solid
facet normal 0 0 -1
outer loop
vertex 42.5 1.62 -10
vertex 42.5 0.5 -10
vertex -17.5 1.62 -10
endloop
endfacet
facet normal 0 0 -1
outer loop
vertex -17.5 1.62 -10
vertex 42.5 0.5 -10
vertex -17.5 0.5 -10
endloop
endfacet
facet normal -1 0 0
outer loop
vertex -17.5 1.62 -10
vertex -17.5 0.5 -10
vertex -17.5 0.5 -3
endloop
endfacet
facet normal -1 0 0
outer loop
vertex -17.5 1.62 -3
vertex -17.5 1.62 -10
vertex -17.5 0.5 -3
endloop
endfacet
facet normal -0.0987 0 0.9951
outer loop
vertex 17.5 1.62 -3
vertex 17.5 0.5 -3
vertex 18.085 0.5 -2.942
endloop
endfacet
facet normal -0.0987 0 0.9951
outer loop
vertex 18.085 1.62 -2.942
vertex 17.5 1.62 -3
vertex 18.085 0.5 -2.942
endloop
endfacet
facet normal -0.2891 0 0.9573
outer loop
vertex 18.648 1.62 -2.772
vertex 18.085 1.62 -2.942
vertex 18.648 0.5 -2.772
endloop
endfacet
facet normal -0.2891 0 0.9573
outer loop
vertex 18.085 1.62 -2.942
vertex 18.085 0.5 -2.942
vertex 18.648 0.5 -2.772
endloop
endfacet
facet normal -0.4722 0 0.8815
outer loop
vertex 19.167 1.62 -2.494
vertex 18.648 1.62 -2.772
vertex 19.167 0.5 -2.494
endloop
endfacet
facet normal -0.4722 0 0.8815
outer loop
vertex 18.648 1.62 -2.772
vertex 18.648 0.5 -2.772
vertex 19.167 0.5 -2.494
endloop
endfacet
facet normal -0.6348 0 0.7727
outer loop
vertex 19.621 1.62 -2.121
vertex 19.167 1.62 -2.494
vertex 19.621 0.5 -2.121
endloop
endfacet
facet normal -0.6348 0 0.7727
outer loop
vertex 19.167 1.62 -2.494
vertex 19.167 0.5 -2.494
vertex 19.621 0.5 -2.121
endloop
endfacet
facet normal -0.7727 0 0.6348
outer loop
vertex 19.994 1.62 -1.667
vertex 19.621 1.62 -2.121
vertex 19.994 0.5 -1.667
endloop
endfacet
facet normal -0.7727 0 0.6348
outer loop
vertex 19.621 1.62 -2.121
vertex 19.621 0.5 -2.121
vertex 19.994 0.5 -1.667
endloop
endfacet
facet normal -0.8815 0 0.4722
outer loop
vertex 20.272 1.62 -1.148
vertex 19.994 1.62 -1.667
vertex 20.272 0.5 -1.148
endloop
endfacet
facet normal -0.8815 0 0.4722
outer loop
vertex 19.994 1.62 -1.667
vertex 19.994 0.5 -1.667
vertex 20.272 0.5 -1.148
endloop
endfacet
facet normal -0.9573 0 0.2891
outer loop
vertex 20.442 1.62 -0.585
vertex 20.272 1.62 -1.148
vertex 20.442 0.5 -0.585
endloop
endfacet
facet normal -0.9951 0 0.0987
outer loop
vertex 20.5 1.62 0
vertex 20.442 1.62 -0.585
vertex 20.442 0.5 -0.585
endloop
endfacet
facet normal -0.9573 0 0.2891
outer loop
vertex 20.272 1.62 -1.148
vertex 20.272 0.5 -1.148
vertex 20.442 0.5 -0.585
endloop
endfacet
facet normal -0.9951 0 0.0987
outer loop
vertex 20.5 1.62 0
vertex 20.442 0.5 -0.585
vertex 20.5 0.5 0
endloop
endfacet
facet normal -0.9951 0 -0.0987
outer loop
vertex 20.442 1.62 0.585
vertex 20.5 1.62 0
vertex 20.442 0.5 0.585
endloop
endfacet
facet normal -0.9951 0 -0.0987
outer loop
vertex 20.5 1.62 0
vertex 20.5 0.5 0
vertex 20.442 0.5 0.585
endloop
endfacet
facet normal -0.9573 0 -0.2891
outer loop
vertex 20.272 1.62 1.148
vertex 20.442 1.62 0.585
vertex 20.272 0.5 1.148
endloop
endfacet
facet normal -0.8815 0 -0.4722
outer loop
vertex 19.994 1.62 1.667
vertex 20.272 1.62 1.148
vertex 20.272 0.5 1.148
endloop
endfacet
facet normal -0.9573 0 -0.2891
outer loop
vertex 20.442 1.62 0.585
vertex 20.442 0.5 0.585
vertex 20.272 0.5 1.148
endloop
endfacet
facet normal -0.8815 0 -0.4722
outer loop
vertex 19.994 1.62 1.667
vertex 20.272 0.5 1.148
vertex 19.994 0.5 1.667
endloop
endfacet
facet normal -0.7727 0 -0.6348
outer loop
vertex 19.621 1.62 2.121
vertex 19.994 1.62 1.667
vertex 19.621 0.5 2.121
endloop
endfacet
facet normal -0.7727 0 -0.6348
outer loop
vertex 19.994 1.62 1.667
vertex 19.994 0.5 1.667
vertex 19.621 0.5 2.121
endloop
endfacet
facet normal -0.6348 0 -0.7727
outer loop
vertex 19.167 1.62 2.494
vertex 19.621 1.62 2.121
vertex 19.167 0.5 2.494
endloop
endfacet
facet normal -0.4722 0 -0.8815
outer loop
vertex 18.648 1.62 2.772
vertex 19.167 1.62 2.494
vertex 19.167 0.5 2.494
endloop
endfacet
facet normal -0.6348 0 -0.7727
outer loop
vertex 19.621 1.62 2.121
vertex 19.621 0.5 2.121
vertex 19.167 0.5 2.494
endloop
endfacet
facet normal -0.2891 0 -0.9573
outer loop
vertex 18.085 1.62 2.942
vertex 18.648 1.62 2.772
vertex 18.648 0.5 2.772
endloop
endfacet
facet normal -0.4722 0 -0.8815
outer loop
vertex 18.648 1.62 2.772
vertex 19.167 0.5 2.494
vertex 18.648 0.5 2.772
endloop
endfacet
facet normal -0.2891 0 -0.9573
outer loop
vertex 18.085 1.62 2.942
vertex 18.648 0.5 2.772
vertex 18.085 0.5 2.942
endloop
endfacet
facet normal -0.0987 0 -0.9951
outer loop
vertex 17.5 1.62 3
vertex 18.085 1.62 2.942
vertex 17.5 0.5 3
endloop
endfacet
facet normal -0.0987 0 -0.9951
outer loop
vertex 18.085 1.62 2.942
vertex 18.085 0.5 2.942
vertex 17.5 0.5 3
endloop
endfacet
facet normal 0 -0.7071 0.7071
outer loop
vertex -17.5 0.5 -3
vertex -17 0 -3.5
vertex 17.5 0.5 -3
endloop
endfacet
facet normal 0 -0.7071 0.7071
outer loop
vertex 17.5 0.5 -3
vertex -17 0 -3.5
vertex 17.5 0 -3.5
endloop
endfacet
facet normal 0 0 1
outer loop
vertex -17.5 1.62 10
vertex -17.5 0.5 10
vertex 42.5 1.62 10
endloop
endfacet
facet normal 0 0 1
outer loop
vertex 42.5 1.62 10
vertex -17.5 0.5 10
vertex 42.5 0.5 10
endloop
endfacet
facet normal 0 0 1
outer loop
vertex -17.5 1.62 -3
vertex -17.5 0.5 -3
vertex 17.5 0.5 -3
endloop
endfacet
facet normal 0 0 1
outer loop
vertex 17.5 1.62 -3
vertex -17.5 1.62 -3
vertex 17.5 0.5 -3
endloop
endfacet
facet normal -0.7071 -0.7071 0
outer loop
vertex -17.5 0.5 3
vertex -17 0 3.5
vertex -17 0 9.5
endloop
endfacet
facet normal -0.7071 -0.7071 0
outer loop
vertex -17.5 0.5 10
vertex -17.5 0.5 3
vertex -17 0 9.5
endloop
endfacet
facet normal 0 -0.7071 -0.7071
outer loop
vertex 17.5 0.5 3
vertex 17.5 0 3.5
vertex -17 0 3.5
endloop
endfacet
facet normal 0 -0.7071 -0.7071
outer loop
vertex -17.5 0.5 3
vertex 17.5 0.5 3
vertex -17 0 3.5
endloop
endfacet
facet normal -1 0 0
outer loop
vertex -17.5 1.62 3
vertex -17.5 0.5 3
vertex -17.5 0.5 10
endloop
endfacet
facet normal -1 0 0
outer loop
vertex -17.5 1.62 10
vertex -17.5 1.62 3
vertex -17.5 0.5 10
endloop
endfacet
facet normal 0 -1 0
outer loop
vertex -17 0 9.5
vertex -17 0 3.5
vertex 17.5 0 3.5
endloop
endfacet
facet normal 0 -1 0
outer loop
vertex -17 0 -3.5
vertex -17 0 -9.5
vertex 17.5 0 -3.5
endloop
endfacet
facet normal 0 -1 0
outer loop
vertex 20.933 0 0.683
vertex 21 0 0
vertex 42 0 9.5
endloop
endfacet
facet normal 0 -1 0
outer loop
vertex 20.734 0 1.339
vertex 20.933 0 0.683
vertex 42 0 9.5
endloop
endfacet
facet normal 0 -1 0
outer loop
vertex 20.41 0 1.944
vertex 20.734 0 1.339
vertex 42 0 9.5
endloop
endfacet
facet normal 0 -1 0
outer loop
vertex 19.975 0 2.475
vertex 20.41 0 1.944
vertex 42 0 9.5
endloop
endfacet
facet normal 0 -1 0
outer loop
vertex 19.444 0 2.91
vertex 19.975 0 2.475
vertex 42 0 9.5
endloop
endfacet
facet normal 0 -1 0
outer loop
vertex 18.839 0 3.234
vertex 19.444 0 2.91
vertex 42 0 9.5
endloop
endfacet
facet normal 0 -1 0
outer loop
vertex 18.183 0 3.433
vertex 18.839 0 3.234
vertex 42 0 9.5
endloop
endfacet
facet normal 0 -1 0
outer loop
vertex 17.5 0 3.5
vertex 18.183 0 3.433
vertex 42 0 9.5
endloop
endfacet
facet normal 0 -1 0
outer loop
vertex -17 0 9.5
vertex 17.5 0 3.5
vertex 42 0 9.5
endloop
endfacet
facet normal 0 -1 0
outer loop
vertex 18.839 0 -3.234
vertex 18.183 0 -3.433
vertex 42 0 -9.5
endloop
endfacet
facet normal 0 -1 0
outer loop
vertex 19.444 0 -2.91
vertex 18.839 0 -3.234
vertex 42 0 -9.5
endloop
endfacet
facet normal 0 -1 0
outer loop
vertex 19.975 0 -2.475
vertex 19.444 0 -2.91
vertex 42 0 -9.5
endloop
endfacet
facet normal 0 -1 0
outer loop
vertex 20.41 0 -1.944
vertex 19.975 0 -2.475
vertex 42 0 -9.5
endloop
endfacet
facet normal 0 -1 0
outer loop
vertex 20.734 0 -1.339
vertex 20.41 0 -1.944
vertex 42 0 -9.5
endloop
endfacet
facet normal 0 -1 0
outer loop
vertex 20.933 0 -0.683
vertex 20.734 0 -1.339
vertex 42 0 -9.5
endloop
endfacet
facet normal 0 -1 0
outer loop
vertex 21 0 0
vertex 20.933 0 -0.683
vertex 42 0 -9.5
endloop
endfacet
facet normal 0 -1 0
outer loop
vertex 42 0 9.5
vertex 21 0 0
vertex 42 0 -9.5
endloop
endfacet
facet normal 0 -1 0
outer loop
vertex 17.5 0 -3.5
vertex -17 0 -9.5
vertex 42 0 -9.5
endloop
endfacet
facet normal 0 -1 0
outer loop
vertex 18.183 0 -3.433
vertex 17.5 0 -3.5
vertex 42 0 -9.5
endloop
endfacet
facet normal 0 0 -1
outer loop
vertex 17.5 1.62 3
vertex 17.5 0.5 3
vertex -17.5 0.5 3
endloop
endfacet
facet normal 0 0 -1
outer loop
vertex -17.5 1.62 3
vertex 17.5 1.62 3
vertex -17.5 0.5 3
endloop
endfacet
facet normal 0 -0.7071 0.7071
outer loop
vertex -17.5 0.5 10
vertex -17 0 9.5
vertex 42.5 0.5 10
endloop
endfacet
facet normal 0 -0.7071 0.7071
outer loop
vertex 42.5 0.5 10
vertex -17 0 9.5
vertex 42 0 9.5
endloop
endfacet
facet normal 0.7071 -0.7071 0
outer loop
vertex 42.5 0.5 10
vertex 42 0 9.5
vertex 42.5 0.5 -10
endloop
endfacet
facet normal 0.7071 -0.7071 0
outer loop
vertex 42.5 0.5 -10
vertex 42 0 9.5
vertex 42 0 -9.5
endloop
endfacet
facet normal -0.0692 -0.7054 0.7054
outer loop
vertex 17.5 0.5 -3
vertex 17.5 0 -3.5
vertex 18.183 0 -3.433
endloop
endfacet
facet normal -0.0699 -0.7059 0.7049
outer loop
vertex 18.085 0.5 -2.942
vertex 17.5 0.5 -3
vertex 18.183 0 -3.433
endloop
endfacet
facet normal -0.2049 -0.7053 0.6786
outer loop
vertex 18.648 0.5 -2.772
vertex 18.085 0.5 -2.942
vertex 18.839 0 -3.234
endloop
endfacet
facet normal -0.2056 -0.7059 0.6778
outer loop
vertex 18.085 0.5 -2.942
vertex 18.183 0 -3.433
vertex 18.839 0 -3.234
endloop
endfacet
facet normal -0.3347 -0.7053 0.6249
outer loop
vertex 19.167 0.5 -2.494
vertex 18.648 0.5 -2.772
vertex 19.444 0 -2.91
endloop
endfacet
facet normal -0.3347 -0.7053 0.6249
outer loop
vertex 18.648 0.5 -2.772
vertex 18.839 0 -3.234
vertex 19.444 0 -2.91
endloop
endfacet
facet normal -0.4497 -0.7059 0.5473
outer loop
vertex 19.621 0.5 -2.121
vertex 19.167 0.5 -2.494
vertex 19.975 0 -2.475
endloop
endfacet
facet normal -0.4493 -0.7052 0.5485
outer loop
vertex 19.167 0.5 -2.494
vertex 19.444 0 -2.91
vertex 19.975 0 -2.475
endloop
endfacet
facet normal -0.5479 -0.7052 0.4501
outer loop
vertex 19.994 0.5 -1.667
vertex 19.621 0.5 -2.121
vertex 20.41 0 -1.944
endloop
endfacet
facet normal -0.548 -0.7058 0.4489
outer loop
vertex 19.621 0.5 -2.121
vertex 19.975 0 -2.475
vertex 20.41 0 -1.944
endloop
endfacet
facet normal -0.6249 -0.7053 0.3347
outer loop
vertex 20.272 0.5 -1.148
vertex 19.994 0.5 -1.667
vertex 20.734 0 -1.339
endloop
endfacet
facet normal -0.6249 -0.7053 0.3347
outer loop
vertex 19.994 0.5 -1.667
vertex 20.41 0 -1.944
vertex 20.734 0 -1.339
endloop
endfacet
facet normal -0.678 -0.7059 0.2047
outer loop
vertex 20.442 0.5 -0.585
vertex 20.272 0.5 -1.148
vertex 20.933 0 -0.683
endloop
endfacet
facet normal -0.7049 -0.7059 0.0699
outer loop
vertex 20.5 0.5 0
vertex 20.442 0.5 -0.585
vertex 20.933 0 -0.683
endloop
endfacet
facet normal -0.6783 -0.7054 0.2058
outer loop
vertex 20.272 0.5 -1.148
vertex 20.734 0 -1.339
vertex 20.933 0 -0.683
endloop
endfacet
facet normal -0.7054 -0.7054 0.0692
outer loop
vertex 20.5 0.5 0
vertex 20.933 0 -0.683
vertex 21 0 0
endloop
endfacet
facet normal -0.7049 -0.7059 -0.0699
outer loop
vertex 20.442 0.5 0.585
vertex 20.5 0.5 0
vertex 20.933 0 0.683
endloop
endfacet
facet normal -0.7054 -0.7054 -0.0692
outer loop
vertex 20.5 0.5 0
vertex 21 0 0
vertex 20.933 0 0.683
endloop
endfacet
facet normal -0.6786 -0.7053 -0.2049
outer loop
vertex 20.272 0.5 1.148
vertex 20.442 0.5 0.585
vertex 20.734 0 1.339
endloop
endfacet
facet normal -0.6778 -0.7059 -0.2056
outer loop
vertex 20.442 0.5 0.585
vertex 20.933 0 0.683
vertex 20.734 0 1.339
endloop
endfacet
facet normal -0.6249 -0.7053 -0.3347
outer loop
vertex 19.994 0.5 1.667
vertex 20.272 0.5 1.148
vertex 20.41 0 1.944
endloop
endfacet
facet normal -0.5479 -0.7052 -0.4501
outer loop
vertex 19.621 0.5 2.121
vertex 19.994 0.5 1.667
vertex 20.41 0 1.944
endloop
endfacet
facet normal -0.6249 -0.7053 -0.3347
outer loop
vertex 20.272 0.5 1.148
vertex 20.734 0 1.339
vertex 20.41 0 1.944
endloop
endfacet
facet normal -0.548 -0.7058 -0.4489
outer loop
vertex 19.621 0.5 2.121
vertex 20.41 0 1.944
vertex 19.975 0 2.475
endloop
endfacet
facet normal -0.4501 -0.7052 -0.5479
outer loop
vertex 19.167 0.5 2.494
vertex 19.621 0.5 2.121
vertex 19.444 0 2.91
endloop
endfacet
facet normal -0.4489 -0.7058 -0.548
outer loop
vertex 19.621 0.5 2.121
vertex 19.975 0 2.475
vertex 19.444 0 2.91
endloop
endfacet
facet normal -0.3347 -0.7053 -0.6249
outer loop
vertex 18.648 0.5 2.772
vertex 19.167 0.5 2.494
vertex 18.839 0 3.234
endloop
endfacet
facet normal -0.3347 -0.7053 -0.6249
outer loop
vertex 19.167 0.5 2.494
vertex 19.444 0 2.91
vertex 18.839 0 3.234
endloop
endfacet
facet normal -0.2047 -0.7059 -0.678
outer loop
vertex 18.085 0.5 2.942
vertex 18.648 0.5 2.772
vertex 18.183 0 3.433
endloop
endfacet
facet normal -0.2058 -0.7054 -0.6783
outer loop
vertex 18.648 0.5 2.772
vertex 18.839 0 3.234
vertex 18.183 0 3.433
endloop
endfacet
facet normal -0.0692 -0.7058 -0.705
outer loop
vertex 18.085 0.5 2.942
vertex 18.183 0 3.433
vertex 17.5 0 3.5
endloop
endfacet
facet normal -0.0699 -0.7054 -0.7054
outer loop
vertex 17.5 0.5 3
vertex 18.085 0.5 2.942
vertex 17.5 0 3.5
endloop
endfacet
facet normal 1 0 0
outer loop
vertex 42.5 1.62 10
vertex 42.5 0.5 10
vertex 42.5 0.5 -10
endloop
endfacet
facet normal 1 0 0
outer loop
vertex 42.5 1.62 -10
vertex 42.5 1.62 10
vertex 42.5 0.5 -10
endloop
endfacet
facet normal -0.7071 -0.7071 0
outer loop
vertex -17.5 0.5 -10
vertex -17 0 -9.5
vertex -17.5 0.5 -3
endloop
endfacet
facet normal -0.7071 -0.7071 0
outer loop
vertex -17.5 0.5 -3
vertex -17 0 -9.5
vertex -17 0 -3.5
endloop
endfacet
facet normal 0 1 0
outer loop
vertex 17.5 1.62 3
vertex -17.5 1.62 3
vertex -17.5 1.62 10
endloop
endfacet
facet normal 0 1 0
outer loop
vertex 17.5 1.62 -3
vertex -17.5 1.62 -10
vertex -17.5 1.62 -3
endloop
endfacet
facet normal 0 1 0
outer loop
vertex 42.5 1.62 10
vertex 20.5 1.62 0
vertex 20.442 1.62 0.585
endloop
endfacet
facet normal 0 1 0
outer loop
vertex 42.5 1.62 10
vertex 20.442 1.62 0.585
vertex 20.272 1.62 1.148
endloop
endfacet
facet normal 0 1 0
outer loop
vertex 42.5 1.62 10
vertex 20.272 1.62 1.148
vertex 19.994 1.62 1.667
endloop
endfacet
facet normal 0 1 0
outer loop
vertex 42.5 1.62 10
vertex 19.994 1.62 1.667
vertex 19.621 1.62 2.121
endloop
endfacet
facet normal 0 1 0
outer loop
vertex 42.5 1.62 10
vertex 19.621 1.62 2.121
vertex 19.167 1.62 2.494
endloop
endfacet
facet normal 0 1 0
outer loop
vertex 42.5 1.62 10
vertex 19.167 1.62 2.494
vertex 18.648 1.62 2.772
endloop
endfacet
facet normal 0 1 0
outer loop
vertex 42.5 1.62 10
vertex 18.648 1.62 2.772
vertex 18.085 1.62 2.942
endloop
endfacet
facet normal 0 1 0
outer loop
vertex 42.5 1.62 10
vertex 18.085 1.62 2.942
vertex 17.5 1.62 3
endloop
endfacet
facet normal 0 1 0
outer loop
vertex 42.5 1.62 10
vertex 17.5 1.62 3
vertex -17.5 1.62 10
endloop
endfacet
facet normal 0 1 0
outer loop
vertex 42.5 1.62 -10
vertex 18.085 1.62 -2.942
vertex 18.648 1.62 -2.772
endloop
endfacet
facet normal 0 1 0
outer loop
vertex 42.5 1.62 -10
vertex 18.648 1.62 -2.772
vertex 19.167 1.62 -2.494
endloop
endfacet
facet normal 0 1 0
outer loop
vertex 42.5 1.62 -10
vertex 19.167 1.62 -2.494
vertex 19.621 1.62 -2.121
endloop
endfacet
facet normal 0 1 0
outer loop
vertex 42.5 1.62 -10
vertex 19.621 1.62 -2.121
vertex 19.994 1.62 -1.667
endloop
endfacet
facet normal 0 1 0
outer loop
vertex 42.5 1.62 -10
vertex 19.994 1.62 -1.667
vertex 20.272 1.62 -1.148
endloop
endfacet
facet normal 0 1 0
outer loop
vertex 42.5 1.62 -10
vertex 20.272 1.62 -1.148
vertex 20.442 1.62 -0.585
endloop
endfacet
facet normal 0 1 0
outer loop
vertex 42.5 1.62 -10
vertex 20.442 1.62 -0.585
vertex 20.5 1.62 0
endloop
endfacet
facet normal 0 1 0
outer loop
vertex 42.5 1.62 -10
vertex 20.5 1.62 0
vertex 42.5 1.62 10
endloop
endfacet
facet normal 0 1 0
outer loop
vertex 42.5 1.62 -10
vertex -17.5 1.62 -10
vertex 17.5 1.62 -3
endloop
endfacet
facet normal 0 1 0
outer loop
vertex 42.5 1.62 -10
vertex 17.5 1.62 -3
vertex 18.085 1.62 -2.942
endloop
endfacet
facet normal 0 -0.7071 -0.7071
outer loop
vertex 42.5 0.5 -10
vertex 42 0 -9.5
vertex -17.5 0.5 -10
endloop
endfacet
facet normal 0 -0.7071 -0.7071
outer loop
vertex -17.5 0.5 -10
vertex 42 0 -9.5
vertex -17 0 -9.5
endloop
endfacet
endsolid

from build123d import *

# Parameters (mm, degrees)
BOSS_EXTRUDE1_DEPTH = 1.62
CHAMFER1_SIZE       = 0.5


with BuildPart() as part:
    # Sketch1 → Boss-Extrude1 (new body)
    with BuildSketch(Plane(origin=(0, 0, 0), x_dir=(1, 0, 0), z_dir=(0, 1, 0))):
        with BuildLine():
            ThreePointArc((17.5, 3), (20.5, 0), (17.5, -3))
            Line((17.5, -3), (-17.5, -3))
            Line((-17.5, -3), (-17.5, -10))
            Line((-17.5, -10), (42.5, -10))
            Line((42.5, -10), (42.5, 10))
            Line((42.5, 10), (-17.5, 10))
            Line((-17.5, 10), (-17.5, 3))
            Line((-17.5, 3), (17.5, 3))
        make_face()
    extrude(amount=BOSS_EXTRUDE1_DEPTH)

    # Chamfer1
    chamfer1_edges = [part.edges().sort_by_distance(p)[0] for p in [
        (-17.5, 0, -6.5),
        (12.5, 0, -10),
        (42.5, 0, 0),
        (12.5, 0, 10),
        (-17.5, 0, 6.5),
        (0, 0, 3),
        (20.5, 0, 0),
        (0, 0, -3),
    ]]
    chamfer(chamfer1_edges, length=CHAMFER1_SIZE)


solid = part.part
